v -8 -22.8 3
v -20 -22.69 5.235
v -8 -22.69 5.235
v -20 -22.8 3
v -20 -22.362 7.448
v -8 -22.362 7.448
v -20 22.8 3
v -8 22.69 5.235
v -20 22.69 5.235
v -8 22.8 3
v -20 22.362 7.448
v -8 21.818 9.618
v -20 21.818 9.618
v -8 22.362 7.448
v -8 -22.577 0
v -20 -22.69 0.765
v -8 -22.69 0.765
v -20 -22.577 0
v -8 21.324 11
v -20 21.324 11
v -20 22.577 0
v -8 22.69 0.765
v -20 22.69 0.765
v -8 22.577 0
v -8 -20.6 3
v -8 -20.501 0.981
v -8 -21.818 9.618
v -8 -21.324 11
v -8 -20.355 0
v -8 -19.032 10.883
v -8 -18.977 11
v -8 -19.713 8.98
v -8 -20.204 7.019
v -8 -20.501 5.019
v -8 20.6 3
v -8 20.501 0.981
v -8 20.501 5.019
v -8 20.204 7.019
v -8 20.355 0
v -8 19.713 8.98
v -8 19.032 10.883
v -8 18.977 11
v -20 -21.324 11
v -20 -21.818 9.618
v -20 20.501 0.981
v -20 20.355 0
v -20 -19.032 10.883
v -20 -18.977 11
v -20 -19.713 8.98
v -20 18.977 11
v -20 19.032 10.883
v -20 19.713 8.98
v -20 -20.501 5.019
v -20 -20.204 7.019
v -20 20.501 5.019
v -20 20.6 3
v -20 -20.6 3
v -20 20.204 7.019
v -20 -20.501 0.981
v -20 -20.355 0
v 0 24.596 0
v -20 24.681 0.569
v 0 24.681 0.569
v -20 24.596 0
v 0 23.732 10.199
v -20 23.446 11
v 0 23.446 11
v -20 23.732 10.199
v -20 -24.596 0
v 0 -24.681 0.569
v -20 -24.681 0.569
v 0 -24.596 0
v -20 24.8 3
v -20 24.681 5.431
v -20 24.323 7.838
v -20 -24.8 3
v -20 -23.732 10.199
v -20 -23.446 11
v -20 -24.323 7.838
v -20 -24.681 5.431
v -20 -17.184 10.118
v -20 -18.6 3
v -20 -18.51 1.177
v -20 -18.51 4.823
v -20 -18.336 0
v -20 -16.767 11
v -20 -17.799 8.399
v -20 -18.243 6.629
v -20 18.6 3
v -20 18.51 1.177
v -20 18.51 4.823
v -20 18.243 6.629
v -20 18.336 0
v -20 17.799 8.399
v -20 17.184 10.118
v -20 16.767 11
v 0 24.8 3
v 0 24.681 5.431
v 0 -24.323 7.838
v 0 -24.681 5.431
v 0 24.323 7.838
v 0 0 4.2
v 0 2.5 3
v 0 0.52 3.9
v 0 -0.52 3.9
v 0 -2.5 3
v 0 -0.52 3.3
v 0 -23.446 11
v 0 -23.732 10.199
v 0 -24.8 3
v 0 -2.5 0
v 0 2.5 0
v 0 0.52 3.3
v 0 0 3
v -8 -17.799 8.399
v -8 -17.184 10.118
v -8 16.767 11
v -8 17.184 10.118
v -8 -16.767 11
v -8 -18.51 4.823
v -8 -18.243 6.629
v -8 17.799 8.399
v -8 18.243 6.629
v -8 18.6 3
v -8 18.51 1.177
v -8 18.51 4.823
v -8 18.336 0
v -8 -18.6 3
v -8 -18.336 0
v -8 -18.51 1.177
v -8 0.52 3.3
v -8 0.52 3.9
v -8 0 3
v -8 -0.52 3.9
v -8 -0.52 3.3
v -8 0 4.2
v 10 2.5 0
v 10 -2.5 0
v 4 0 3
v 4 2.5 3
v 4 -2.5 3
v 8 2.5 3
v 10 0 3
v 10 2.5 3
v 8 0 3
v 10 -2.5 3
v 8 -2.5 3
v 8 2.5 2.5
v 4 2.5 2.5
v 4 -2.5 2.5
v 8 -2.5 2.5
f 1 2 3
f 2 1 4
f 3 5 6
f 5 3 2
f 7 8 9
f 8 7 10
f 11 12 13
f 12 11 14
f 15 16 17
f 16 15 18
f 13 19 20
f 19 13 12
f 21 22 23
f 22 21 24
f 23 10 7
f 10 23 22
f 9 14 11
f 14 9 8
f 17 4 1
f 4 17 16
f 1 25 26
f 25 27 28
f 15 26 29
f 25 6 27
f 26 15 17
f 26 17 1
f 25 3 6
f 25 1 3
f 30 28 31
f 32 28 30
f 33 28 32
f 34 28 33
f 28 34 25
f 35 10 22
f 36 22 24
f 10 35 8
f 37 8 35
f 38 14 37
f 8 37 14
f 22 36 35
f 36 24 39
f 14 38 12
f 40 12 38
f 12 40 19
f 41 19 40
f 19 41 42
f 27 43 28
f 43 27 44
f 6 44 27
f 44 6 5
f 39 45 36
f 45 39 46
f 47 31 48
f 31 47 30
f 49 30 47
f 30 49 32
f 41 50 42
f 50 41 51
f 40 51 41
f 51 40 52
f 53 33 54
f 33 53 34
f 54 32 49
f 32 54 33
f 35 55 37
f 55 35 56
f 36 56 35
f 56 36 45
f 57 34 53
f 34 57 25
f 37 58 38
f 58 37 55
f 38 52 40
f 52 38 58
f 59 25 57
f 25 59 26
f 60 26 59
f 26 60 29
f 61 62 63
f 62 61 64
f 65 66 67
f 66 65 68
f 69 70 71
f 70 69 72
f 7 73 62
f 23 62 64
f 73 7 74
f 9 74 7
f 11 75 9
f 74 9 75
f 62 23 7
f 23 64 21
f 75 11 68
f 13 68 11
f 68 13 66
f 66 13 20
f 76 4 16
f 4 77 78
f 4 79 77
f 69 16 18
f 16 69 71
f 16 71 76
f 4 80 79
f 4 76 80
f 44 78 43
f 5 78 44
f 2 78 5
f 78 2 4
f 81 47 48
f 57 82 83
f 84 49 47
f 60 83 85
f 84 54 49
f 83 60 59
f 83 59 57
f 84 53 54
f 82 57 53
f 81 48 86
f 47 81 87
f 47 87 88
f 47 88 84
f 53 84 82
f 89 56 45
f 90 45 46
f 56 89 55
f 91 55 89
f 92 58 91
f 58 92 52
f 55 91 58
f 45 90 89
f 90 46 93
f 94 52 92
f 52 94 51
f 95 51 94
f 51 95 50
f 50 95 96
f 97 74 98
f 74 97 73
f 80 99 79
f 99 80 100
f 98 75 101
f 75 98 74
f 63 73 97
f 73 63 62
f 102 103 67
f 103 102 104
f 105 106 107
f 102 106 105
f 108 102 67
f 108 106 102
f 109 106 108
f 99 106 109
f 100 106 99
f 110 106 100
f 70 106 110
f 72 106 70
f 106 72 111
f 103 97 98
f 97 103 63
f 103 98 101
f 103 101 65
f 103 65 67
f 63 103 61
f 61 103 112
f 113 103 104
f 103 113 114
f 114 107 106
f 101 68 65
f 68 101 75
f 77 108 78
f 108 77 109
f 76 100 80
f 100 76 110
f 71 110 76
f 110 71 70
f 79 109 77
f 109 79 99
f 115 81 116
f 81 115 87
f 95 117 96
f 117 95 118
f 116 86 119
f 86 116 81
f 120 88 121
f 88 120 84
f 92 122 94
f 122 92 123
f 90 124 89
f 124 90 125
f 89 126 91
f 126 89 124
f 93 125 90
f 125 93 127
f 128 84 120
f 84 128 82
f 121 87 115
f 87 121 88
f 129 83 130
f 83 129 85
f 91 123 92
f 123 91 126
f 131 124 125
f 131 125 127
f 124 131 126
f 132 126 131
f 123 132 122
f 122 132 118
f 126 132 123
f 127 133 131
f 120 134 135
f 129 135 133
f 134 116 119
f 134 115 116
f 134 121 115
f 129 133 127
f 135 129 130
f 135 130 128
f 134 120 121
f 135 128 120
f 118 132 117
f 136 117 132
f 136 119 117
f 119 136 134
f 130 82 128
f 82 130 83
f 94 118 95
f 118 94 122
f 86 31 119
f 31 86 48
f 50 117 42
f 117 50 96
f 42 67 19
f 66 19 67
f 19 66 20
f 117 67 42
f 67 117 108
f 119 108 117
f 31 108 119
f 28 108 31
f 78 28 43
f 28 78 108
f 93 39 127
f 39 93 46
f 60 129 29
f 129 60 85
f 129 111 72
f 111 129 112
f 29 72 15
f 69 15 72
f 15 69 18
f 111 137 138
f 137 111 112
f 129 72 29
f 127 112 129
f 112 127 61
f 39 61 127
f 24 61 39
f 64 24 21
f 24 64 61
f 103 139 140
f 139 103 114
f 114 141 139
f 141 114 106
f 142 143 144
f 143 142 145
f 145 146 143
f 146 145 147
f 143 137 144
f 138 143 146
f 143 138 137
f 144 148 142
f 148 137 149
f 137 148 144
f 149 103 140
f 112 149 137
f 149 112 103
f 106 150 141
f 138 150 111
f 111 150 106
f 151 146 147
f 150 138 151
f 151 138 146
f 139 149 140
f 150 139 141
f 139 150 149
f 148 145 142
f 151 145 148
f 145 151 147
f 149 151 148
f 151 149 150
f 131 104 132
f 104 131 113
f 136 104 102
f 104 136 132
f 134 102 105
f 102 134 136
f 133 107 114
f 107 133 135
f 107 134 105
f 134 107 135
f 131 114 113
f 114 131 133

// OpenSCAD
// probe_electrolysis_grip - Holds a probe wire in place while the end is electro-etched
// (c)2024 vik@diamondage.co.nz, released under GPL V3 or later.
// Note: Values given fit a standard 45mm urine sample container

wire_rad=0.6;
grip_tab_height=10;
grip_tab_width=5;
grip_tab_thick=3;   // Offset the assembly so that the grip is thinner.
wall=2;
pot_max_rad=45.6/2;
pot_min_rad=41.2/2;
brim_height=20;
bar_width=11;
bar_height=8;

// A shape like the top entrance to the pot
module pot_model() {
    difference() {
        cylinder(h=brim_height,r=pot_max_rad,$fn=64);
        cylinder(h=brim_height,r=pot_min_rad,$fn=64);
    }
}

module pot_lid() difference() {
    // Start with a cylinder that is bigger than the pot
    cylinder(h=brim_height,r=pot_max_rad+wall,$fn=64);
    // Chop out the pot brim
    translate([0,0,bar_height]) pot_model();
    // Leave the bar height in the moddle clear
    translate([0,0,bar_height]) cylinder(h=brim_height,r=pot_min_rad-wall,$fn=64);
}

module electro_grip() difference() {
    union() {
        // Keep the bot on the middle of the lid that is the width of the bar.
        intersection() {
            pot_lid();
            translate([bar_width/2-grip_tab_thick,bar_width/2,0]) cube([bar_width,pot_max_rad*4,brim_height*4],center=true);
        }
        // Add a tab to clip the wire onto. Put a notch in it for croc clip
        translate([-grip_tab_thick,-grip_tab_width/2,-grip_tab_height]) difference() {
            cube([grip_tab_thick,grip_tab_width,grip_tab_height]);
            translate([grip_tab_thick,0,grip_tab_height-6]) cube([1,grip_tab_width*3,4],center=true);
        }
    }
    // punch a hole in the middle for the wire
    translate([wire_rad,0,0]) cylinder(h=bar_height*5,r=wire_rad,center=true,$fn=6);
}

translate([0,0,grip_tab_thick]) rotate([0,-90,0])
electro_grip();
